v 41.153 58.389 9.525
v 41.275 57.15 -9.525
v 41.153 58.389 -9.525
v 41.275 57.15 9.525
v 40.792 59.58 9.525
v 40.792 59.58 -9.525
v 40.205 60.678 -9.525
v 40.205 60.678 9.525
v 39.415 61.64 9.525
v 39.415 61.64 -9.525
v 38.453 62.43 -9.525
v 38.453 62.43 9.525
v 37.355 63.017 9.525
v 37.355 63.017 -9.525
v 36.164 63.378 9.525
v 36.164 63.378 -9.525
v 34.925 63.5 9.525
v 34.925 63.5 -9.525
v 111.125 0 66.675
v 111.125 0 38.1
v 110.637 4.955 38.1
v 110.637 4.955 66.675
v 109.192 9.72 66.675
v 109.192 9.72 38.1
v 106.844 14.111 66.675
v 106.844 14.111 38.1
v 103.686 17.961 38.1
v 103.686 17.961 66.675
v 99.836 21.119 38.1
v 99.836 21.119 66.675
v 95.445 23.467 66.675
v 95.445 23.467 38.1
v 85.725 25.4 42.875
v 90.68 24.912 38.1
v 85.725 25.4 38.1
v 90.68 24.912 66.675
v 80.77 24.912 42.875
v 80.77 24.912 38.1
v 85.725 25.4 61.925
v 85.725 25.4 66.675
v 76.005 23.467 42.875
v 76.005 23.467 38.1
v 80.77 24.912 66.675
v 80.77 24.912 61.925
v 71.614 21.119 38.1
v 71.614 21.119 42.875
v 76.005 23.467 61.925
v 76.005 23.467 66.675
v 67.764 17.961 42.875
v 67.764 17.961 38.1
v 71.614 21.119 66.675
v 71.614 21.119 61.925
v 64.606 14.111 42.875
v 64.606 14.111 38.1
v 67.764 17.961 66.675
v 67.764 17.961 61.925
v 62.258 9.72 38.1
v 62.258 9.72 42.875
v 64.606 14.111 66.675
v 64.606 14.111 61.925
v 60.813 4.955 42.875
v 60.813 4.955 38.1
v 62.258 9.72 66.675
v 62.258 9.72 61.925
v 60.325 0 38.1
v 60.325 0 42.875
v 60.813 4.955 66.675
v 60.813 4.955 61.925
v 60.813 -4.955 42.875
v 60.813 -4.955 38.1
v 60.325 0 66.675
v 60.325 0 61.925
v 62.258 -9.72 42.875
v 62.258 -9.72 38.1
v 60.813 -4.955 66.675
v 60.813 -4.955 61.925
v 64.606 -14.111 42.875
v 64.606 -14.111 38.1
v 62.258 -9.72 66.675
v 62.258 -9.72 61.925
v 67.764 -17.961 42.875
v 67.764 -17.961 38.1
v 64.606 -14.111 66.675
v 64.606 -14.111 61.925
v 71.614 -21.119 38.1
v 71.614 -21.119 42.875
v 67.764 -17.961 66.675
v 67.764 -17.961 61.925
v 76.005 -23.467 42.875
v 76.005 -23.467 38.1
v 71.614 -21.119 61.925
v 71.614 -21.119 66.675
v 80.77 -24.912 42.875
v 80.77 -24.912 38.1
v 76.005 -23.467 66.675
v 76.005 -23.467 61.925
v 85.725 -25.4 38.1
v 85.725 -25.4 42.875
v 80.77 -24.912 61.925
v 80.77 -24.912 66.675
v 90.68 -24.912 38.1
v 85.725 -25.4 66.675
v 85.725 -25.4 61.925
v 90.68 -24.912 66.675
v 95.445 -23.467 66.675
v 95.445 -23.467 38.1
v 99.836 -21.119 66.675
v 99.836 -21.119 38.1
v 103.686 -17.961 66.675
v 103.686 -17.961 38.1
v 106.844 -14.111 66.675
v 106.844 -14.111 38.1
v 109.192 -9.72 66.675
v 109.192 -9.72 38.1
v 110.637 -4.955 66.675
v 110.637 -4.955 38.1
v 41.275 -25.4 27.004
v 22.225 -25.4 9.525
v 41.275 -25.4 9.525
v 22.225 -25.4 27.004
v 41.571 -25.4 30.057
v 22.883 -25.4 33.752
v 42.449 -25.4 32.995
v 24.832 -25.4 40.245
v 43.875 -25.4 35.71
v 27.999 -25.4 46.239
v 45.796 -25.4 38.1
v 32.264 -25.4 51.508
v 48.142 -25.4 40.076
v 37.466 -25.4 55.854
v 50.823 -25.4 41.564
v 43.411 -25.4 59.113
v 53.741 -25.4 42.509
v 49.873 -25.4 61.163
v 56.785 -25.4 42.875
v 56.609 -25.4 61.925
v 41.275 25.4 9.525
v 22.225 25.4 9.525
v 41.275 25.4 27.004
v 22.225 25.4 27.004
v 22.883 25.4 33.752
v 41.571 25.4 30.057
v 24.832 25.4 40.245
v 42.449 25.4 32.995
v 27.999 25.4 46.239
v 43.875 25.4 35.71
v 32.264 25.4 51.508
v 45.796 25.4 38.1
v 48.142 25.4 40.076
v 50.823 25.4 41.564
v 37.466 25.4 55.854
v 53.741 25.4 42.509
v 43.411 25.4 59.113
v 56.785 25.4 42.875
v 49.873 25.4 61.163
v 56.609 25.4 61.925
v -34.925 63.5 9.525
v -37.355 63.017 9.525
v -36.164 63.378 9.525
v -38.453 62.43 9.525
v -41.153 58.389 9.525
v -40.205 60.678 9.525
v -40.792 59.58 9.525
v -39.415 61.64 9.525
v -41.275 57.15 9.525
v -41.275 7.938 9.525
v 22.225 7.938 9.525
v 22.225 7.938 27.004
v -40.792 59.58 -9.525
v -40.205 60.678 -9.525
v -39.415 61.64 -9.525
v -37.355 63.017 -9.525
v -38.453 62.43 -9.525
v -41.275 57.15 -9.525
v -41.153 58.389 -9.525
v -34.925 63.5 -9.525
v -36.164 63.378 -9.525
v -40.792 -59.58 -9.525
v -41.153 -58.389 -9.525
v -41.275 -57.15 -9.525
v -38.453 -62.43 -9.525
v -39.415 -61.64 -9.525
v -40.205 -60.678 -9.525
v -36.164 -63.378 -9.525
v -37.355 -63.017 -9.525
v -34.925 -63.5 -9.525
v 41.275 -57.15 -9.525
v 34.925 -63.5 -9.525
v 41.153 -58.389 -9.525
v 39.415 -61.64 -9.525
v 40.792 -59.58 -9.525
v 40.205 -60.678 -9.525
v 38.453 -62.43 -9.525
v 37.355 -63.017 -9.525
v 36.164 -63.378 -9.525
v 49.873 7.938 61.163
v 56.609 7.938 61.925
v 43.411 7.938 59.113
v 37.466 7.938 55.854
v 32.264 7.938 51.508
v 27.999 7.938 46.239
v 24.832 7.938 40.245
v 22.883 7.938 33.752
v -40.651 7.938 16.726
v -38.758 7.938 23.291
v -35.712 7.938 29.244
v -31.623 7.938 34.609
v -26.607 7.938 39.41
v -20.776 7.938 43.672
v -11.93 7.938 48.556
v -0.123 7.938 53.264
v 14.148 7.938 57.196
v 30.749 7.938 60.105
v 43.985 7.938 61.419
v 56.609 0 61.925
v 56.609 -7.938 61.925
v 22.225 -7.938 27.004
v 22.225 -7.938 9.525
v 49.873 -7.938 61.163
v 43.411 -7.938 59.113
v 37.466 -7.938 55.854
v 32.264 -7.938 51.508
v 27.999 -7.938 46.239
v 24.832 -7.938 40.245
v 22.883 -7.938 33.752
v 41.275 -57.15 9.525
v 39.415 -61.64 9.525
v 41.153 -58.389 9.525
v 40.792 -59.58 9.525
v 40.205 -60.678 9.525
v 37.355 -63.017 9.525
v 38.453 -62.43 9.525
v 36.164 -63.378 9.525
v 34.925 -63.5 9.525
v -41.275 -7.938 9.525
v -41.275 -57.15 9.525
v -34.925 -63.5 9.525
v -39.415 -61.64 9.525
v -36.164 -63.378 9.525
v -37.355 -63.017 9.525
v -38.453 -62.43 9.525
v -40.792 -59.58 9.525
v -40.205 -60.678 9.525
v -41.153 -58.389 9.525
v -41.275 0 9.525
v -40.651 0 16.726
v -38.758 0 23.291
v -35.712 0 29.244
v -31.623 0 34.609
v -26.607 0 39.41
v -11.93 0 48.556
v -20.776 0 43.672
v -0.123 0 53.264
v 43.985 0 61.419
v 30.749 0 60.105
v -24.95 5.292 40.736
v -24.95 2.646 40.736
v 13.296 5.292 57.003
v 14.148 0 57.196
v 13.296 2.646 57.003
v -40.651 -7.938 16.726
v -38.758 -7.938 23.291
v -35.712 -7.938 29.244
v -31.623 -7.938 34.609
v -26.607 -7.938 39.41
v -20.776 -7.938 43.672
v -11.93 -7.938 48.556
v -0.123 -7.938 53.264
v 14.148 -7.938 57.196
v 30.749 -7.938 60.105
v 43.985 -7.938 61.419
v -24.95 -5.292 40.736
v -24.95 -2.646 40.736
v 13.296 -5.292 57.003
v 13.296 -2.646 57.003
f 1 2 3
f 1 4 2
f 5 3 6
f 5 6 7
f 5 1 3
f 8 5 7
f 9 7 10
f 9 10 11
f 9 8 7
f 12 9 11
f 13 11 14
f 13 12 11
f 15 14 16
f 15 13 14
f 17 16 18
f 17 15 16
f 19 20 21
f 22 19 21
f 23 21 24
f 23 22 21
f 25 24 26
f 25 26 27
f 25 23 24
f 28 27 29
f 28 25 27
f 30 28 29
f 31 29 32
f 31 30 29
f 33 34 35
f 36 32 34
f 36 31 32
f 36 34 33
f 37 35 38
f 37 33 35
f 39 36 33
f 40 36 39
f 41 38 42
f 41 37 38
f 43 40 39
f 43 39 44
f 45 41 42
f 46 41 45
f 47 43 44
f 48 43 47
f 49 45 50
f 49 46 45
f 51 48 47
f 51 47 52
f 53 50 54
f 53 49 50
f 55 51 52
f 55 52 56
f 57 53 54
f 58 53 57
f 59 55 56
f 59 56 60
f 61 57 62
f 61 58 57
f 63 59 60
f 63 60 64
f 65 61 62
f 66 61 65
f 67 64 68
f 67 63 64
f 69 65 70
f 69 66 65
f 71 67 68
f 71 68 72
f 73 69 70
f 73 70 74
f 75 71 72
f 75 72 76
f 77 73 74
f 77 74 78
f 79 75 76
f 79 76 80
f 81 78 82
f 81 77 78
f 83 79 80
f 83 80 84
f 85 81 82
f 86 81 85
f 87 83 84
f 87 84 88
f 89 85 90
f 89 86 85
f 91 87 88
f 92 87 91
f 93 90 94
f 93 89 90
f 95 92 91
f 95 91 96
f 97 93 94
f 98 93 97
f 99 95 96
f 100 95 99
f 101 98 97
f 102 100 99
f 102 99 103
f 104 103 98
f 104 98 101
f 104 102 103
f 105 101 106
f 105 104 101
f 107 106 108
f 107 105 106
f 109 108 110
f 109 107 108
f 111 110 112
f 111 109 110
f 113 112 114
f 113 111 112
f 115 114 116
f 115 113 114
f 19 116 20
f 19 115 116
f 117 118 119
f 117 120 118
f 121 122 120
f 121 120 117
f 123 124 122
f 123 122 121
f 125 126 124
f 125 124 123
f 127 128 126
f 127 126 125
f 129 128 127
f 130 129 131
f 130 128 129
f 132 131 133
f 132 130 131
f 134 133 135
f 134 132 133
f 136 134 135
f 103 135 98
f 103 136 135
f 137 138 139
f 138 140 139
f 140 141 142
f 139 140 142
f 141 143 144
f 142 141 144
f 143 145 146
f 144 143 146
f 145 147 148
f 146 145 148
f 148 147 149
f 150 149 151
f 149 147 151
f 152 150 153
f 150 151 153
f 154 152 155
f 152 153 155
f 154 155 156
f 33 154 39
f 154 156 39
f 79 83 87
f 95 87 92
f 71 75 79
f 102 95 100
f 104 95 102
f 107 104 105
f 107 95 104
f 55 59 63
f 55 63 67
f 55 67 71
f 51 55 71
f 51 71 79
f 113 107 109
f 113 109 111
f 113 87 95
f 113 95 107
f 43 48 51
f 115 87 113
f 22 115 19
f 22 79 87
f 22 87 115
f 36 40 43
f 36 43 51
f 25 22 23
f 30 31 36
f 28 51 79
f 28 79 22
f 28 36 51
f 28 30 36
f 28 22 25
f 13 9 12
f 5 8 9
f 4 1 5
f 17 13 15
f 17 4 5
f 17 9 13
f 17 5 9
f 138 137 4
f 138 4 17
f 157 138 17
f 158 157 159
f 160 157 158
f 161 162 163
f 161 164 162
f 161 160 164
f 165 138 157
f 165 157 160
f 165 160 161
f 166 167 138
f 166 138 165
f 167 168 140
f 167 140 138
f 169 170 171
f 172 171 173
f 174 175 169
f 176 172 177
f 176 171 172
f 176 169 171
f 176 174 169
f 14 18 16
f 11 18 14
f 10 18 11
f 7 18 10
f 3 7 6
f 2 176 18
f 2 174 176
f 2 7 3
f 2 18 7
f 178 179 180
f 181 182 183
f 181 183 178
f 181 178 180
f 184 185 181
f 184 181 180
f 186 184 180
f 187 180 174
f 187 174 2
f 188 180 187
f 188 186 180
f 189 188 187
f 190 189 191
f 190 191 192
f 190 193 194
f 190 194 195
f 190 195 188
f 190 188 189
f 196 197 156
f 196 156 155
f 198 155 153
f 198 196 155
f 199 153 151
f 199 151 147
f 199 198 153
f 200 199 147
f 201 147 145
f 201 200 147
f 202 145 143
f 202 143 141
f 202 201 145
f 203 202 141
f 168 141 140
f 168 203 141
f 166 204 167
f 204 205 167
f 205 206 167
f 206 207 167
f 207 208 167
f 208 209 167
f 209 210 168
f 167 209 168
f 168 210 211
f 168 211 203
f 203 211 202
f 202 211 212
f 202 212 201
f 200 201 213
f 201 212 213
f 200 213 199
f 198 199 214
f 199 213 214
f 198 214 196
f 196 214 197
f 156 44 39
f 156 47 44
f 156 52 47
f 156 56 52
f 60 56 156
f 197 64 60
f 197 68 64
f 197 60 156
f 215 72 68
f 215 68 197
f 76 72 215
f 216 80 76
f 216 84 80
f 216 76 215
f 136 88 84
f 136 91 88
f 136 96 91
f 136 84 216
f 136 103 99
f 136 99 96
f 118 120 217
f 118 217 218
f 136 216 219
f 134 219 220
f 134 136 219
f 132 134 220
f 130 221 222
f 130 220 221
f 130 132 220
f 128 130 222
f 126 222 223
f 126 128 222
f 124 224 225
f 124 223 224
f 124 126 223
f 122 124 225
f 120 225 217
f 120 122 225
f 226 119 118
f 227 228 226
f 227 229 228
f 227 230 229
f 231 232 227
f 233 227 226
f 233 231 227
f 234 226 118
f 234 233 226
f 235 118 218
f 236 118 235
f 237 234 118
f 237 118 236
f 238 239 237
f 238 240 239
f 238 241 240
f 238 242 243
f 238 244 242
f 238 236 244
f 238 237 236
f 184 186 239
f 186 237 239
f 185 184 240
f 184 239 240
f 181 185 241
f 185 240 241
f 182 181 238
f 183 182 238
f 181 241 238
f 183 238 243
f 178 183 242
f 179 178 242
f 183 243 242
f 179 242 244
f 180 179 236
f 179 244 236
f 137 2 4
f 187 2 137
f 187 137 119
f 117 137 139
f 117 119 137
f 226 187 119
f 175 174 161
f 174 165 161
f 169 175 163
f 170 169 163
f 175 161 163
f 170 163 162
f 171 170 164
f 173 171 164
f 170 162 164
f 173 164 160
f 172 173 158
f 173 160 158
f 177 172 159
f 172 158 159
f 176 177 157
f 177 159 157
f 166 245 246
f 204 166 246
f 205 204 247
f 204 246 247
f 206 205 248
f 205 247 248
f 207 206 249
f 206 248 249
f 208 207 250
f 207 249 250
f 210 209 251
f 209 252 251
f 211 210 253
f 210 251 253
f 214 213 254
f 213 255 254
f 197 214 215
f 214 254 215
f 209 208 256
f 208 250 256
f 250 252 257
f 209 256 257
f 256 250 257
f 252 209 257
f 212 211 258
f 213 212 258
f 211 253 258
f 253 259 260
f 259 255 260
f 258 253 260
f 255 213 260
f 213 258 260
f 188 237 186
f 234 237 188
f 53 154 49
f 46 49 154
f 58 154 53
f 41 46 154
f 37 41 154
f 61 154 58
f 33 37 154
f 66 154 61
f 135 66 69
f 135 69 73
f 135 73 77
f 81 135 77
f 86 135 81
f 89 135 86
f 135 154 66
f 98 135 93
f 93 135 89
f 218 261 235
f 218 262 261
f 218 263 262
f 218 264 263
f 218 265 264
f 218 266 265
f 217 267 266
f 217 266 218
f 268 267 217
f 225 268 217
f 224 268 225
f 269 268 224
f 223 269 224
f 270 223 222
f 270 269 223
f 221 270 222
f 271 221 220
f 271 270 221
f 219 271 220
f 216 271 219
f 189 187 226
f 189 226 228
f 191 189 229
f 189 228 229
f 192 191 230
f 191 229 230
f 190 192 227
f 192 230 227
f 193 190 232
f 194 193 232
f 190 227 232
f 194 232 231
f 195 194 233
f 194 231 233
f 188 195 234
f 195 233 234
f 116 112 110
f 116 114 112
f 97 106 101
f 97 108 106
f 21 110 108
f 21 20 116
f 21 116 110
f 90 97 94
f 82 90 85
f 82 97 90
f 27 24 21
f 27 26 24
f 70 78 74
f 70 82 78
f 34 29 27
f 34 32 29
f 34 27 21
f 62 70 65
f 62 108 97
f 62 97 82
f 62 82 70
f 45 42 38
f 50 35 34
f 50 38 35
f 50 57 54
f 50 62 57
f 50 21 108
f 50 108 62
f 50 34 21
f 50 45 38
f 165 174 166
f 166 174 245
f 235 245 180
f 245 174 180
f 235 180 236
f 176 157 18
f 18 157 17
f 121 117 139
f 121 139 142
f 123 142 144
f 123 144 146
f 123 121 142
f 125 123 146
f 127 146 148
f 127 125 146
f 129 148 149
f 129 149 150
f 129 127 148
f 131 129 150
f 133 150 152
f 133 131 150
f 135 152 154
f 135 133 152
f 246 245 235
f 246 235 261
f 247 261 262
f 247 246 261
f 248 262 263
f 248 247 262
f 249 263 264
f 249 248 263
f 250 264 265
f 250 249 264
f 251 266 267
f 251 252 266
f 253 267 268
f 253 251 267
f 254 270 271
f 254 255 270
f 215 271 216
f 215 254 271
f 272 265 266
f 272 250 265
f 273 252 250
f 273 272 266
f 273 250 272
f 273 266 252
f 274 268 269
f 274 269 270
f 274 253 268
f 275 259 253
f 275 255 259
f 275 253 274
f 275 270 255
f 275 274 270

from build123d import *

# Parameters (mm, degrees)
F0_W     = 63.5
F0_H     = 19.05
F0_W_2   = 19.05
F1_DEPTH = 63.5
F0_W_3   = 25.4
F2_DEPTH = 25.4
F3_DEPTH = 7.9375
F5_R     = 6.35


with BuildPart() as f1:
    # F0 (on Front) → F1 (new body, symmetric)
    with BuildSketch(Plane.XZ):
        with Locations((-9.525, 0)):
            Rectangle(F0_W, F0_H)
        with Locations((31.75, 0)):
            Rectangle(F0_W_2, F0_H)
    extrude(amount=F1_DEPTH, both=True)

    # F0 (on Front) → F2 (join, symmetric)
    with BuildSketch(Plane.XZ):
        with BuildLine():
            Line((22.225, 9.525), (41.275, 9.525))
            Line((41.275, 9.525), (41.275, 27.004391))
            ThreePointArc((41.275, 27.004391), (45.79645, 38.1), (56.785241, 42.8752))
            Line((56.785241, 42.8752), (60.325, 42.8752))
            Line((60.325, 42.8752), (60.325, 61.9252))
            Line((60.325, 61.9252), (56.608955, 61.9252))
            ThreePointArc((56.608955, 61.9252), (32.263743, 51.508061), (22.225, 27.004391))
            Line((22.225, 27.004391), (22.225, 9.525))
        make_face()
        with Locations((73.025, 52.4002)):
            Rectangle(F0_W_3, F0_H)
    extrude(amount=F2_DEPTH, both=True)

    # F0 (on Front) → F3 (join, symmetric)
    with BuildSketch(Plane.XZ):
        with BuildLine():
            Line((-41.275, 9.525), (22.225, 9.525))
            Line((22.225, 9.525), (22.225, 27.004391))
            ThreePointArc((22.225, 27.004391), (32.263743, 51.508061), (56.608955, 61.9252))
            add(Edge.make_bspline(
                [(-41.275, 9.525), (-41.526487, 49.406126), (16.378682, 61.477449), (56.608955, 61.9252)],
                knots=[0, 0, 0, 0, 111.027247, 111.027247, 111.027247, 111.027247], degree=3))
        make_face()
    extrude(amount=F3_DEPTH, both=True)

    # F0 (on Front) → F4 (revolve)
    with BuildSketch(Plane.XZ):
        Polygon((85.725, 61.9252), (85.725, 42.8752), (85.725, 38.1), (111.125, 38.1), (111.125, 66.675), (85.725, 66.675), align=None)
    revolve(axis=Axis((85.725, 0, 52.3875), (0, 0, 1)))

    # F5
    f5_edges = [f1.edges().sort_by_distance(p)[0] for p in [
        (41.275, -63.5, 0),
        (-41.275, -63.5, 0),
        (41.275, 63.5, 0),
        (-41.275, 63.5, 0),
    ]]
    fillet(f5_edges, radius=F5_R)


solid = f1.part
